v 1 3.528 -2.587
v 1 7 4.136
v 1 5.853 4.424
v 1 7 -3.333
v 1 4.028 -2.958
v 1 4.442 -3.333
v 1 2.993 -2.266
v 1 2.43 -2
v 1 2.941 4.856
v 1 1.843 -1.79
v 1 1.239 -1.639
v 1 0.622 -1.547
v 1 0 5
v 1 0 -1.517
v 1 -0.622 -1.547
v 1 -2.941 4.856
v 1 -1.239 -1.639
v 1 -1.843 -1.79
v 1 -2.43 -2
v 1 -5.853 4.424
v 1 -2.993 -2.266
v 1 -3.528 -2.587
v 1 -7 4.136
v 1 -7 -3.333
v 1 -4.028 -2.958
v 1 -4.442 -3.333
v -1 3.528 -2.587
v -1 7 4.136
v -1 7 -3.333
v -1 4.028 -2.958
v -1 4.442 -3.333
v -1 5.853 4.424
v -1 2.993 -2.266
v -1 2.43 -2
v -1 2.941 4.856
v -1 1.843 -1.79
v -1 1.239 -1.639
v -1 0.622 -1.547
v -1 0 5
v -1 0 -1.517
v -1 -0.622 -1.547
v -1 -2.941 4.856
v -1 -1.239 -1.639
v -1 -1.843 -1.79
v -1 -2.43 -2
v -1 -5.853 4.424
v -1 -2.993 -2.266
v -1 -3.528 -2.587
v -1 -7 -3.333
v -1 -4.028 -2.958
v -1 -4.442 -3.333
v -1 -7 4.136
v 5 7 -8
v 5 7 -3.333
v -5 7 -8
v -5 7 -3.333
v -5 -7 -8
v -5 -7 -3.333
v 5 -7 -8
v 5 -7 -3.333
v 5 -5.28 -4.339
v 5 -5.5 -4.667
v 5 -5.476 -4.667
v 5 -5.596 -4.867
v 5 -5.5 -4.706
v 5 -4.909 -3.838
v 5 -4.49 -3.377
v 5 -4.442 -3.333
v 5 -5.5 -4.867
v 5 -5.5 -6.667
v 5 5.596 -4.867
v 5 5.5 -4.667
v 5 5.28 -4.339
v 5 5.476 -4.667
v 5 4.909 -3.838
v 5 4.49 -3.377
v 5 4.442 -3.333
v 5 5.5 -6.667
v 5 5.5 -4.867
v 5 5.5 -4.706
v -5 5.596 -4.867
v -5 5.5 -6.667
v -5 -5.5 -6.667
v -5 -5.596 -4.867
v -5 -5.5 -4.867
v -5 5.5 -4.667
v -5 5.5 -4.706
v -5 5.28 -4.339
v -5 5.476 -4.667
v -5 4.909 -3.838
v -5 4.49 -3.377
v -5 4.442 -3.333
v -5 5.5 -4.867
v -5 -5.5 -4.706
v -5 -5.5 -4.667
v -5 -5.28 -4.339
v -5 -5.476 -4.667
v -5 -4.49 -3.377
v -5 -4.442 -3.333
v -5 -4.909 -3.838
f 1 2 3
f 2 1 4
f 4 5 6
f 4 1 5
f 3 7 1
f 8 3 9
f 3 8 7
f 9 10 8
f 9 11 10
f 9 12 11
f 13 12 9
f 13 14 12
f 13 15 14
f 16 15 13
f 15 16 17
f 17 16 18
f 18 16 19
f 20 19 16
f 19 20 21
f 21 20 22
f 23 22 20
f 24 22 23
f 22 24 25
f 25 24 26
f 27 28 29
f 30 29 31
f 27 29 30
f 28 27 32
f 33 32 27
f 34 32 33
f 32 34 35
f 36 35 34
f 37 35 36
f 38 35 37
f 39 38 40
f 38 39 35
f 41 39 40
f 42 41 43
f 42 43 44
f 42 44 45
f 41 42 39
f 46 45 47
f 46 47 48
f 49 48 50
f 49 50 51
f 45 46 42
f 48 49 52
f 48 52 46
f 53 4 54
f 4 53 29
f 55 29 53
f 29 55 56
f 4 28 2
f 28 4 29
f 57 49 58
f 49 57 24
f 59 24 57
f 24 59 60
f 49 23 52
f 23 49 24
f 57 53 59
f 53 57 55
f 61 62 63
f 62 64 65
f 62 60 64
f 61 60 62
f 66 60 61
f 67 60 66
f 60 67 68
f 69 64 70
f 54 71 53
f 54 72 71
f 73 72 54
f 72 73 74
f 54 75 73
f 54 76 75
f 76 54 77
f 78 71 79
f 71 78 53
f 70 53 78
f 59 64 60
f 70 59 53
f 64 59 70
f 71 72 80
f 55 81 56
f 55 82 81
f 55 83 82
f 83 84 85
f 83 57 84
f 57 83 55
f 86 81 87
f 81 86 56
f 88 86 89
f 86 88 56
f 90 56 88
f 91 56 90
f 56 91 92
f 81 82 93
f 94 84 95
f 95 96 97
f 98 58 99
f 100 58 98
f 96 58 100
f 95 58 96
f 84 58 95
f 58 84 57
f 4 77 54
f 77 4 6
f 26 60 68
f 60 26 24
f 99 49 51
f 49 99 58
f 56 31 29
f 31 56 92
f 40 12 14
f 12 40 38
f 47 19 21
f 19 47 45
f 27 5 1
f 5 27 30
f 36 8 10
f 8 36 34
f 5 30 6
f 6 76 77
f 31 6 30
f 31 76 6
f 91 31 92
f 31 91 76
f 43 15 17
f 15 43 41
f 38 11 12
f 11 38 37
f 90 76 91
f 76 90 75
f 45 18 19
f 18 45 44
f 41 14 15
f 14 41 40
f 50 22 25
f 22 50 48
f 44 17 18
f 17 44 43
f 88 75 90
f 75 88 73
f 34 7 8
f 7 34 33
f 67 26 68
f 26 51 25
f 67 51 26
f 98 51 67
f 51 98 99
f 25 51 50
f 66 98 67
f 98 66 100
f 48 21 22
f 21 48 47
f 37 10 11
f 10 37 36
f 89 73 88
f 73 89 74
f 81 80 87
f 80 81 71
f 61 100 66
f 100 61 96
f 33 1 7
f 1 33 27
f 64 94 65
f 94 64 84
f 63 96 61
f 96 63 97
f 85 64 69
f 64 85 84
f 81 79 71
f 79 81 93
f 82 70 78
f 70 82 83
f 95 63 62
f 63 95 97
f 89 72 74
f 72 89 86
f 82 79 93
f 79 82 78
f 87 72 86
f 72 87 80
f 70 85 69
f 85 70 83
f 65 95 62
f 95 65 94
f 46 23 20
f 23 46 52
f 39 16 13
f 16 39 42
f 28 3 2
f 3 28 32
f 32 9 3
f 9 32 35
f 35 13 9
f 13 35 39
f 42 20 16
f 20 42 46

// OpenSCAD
length = 14;
width = 14;
thickness = 2;

module baffle(slot) {
 difference() {
  union() {
     cube([length,width,thickness],center=true);
     translate([1+length/3,0,0])
     cube([length/3,width,5*thickness],center=true);
  }
  translate([1+length/3,0,5*thickness/2])
    cube([2,slot,20],center=true);

    translate([3.2+length/3,0,0])
  difference() {
      cylinder(r=6.35,h=20,center=true,$fn=64);
      translate([7,0,0])
         cube([20,20,20],center=true);
  }
 }
}
module jarwall() {
  difference() {
      cube([30,30,30],center=true);
      translate([25,0,0])
         cylinder(r=30,h=40,center=true,$fn=64);
  }
}

rotate([0,90,0])
  difference() {
    baffle(11);
    jarwall();
  }
